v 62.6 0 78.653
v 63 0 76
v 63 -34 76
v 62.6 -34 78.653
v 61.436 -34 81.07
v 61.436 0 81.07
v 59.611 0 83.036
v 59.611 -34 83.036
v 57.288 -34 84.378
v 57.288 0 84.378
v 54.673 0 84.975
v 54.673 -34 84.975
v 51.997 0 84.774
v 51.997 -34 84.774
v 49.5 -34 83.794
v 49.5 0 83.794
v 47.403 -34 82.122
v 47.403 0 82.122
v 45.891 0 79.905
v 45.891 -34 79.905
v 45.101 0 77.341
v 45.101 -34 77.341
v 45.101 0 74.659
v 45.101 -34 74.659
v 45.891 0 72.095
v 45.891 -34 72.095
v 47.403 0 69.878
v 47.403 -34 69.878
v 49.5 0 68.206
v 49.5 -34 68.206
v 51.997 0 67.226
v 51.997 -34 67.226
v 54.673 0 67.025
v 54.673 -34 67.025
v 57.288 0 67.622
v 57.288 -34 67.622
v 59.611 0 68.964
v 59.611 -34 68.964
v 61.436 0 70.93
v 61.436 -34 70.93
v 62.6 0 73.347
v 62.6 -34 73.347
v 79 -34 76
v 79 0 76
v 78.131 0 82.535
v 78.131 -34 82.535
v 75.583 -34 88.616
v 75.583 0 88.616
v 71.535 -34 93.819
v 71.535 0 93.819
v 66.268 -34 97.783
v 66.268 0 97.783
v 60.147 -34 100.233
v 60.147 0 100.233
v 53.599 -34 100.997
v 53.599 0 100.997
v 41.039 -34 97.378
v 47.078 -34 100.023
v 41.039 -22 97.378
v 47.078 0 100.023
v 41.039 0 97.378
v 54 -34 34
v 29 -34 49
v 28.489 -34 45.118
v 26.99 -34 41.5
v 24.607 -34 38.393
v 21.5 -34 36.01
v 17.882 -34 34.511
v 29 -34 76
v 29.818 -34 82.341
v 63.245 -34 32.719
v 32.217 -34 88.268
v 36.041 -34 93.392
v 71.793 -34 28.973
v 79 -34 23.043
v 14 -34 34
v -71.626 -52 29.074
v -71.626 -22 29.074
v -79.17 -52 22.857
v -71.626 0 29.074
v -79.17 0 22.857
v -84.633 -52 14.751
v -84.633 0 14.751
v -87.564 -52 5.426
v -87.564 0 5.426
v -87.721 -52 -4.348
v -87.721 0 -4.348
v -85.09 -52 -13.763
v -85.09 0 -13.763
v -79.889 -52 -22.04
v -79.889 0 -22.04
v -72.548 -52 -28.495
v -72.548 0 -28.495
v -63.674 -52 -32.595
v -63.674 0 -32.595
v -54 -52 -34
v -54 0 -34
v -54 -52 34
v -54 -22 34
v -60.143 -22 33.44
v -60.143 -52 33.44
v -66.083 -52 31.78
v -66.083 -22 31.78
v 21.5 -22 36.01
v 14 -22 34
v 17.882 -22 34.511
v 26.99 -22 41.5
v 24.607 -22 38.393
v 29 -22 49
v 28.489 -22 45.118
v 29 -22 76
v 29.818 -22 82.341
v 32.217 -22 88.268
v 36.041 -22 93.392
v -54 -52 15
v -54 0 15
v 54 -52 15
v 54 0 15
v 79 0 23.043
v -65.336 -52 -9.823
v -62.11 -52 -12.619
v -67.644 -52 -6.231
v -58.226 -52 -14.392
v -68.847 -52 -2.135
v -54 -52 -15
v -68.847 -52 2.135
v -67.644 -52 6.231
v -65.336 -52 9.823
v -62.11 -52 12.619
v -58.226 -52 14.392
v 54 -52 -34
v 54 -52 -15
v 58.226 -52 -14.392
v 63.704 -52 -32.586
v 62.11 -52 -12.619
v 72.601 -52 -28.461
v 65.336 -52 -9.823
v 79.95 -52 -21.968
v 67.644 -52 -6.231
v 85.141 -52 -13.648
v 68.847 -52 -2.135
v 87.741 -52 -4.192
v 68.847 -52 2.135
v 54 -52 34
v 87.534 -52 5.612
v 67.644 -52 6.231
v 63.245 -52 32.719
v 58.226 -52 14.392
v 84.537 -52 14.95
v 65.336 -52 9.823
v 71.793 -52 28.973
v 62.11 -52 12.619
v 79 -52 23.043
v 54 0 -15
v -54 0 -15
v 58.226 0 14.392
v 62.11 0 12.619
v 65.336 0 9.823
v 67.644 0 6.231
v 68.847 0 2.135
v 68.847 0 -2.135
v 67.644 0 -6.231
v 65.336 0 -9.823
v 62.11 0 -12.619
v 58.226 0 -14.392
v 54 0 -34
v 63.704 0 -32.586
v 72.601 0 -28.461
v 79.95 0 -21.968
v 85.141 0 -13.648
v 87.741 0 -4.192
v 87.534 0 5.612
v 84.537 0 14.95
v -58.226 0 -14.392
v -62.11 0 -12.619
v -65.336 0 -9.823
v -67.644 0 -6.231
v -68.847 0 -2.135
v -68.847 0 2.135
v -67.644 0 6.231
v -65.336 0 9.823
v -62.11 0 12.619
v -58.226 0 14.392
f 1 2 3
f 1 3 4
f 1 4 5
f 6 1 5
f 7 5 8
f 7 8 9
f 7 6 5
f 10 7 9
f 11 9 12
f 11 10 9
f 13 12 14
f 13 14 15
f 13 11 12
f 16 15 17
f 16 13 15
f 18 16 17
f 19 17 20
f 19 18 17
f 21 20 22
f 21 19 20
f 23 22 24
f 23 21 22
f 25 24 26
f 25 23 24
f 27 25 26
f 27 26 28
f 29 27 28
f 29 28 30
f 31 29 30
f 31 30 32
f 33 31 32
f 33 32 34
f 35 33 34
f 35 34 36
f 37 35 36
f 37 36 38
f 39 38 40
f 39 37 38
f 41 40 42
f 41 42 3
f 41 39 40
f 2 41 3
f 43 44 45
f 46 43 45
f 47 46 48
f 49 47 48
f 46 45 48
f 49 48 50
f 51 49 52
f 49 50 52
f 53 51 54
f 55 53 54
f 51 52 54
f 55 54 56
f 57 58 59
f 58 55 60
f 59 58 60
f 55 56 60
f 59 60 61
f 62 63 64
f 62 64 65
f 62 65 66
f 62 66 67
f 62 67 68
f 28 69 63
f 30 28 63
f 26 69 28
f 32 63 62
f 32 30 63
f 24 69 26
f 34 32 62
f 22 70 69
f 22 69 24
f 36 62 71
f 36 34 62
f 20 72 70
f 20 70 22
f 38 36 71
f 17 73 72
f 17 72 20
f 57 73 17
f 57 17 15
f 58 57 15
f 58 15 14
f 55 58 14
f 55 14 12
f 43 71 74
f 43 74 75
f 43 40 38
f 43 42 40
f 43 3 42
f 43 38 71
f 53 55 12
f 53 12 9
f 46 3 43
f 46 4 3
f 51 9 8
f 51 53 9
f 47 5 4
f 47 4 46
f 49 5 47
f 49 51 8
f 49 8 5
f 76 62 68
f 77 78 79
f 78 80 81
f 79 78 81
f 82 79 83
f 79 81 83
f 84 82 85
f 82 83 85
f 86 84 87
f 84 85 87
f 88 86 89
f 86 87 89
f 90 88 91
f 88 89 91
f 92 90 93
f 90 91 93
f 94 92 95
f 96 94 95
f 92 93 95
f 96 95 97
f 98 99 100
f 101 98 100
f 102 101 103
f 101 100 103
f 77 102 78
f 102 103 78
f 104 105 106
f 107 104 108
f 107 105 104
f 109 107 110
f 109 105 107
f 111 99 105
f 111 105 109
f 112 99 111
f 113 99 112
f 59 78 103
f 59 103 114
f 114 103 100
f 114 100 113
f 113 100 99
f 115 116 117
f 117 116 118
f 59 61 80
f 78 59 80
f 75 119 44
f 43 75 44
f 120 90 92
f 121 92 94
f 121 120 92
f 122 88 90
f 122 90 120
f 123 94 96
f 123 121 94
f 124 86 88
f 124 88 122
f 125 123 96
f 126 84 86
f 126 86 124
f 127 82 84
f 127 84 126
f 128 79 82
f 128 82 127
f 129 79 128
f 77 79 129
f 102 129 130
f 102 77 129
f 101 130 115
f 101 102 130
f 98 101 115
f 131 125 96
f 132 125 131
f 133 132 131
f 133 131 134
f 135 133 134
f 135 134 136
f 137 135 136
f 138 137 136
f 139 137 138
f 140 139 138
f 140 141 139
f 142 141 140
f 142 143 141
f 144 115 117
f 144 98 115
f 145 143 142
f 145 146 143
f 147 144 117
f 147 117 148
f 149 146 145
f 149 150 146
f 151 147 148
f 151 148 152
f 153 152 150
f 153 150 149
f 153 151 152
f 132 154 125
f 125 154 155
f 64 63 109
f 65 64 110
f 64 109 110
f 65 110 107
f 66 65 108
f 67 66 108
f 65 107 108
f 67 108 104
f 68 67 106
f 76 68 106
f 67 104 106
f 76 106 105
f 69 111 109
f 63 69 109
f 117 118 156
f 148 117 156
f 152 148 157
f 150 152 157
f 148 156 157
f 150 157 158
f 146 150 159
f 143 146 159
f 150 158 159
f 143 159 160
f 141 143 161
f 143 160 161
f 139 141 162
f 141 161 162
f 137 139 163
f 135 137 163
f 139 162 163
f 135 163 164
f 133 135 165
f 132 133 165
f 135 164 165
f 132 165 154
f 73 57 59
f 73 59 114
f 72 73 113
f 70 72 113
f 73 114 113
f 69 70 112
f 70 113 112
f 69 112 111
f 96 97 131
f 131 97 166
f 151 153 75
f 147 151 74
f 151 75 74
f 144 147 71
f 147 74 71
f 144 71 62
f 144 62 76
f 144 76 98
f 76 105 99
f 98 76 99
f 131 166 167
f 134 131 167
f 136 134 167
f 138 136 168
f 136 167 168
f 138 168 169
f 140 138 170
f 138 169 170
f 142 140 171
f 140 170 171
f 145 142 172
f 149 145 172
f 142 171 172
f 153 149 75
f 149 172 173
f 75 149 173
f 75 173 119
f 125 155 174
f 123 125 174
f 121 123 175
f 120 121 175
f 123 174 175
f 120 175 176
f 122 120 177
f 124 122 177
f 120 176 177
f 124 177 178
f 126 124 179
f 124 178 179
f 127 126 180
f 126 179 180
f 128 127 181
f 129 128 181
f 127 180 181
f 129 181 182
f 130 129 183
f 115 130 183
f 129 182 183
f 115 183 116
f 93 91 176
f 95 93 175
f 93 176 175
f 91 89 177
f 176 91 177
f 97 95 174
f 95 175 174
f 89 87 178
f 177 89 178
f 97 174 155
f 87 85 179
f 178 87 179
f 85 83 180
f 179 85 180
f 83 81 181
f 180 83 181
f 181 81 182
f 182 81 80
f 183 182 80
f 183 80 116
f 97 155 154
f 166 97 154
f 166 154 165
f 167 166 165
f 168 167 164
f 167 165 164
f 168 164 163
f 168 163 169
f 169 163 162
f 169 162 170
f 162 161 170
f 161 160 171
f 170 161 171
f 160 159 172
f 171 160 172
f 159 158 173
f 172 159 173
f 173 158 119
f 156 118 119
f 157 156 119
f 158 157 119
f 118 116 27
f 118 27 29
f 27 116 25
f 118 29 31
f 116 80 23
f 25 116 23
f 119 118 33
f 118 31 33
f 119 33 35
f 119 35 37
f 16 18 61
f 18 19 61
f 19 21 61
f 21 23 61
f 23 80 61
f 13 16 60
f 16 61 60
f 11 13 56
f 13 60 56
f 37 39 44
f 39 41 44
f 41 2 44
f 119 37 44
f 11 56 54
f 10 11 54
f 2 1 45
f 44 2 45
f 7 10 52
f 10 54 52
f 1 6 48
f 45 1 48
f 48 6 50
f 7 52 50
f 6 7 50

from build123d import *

# Parameters (mm, degrees)
F1_DEPTH = 52
F2_DEPTH = 22
F0_R     = 9
F3_DEPTH = 34


with BuildPart() as f1:
    # F0 (on Front) → F1 (new body)
    with BuildSketch(Plane.XZ):
        with BuildLine():
            Line((14, 34), (-54, 34))
            ThreePointArc((-54, 34), (-63.150826, 32.745418), (-71.62633, 29.074258))
            ThreePointArc((-71.62633, 29.074258), (-86.745418, -9.150826), (-54, -34))
            Line((-54, -34), (54, -34))
            ThreePointArc((54, -34), (85.140624, -13.647768), (79, 23.043437))
            ThreePointArc((79, 23.043437), (67.647768, 31.140624), (54, 34))
            Line((54, 34), (27.266499, 34))
            Line((27.266499, 34), (14, 34))
        make_face()
        with BuildLine():
            ThreePointArc((-54, -15), (-69, 0), (-54, 15))
            Line((-54, 15), (54, 15))
            ThreePointArc((54, 15), (69, 0), (54, -15))
            Line((54, -15), (-54, -15))
        make_face(mode=Mode.SUBTRACT)
    extrude(amount=F1_DEPTH)

    # F0 (on Front) → F2 (join)
    with BuildSketch(Plane.XZ):
        with BuildLine():
            ThreePointArc((-71.62633, 29.074258), (-63.150826, 32.745418), (-54, 34))
            Line((-54, 34), (14, 34))
            ThreePointArc((14, 34), (24.606602, 38.393398), (29, 49))
            Line((29, 49), (29, 76))
            ThreePointArc((29, 76), (32.216825, 88.267571), (41.039463, 97.378131))
            Line((41.039463, 97.378131), (-71.62633, 29.074258))
        make_face()
    extrude(amount=F2_DEPTH)

    # F0 (on Front) → F3 (join)
    with BuildSketch(Plane.XZ):
        with BuildLine():
            ThreePointArc((29, 49), (24.606602, 38.393398), (14, 34))
            Line((14, 34), (27.266499, 34))
            Line((27.266499, 34), (54, 34))
            ThreePointArc((54, 34), (67.647768, 31.140624), (79, 23.043437))
            Line((79, 23.043437), (79, 76))
            ThreePointArc((79, 76), (54, 51), (29, 76))
            Line((29, 76), (29, 49))
        make_face()
        with BuildLine():
            ThreePointArc((79, 76), (66.267571, 97.783175), (41.039463, 97.378131))
            ThreePointArc((41.039463, 97.378131), (32.216825, 88.267571), (29, 76))
            ThreePointArc((29, 76), (54, 51), (79, 76))
        make_face()
        with Locations((54, 76)):
            Circle(F0_R, mode=Mode.SUBTRACT)
    extrude(amount=F3_DEPTH)


solid = f1.part
